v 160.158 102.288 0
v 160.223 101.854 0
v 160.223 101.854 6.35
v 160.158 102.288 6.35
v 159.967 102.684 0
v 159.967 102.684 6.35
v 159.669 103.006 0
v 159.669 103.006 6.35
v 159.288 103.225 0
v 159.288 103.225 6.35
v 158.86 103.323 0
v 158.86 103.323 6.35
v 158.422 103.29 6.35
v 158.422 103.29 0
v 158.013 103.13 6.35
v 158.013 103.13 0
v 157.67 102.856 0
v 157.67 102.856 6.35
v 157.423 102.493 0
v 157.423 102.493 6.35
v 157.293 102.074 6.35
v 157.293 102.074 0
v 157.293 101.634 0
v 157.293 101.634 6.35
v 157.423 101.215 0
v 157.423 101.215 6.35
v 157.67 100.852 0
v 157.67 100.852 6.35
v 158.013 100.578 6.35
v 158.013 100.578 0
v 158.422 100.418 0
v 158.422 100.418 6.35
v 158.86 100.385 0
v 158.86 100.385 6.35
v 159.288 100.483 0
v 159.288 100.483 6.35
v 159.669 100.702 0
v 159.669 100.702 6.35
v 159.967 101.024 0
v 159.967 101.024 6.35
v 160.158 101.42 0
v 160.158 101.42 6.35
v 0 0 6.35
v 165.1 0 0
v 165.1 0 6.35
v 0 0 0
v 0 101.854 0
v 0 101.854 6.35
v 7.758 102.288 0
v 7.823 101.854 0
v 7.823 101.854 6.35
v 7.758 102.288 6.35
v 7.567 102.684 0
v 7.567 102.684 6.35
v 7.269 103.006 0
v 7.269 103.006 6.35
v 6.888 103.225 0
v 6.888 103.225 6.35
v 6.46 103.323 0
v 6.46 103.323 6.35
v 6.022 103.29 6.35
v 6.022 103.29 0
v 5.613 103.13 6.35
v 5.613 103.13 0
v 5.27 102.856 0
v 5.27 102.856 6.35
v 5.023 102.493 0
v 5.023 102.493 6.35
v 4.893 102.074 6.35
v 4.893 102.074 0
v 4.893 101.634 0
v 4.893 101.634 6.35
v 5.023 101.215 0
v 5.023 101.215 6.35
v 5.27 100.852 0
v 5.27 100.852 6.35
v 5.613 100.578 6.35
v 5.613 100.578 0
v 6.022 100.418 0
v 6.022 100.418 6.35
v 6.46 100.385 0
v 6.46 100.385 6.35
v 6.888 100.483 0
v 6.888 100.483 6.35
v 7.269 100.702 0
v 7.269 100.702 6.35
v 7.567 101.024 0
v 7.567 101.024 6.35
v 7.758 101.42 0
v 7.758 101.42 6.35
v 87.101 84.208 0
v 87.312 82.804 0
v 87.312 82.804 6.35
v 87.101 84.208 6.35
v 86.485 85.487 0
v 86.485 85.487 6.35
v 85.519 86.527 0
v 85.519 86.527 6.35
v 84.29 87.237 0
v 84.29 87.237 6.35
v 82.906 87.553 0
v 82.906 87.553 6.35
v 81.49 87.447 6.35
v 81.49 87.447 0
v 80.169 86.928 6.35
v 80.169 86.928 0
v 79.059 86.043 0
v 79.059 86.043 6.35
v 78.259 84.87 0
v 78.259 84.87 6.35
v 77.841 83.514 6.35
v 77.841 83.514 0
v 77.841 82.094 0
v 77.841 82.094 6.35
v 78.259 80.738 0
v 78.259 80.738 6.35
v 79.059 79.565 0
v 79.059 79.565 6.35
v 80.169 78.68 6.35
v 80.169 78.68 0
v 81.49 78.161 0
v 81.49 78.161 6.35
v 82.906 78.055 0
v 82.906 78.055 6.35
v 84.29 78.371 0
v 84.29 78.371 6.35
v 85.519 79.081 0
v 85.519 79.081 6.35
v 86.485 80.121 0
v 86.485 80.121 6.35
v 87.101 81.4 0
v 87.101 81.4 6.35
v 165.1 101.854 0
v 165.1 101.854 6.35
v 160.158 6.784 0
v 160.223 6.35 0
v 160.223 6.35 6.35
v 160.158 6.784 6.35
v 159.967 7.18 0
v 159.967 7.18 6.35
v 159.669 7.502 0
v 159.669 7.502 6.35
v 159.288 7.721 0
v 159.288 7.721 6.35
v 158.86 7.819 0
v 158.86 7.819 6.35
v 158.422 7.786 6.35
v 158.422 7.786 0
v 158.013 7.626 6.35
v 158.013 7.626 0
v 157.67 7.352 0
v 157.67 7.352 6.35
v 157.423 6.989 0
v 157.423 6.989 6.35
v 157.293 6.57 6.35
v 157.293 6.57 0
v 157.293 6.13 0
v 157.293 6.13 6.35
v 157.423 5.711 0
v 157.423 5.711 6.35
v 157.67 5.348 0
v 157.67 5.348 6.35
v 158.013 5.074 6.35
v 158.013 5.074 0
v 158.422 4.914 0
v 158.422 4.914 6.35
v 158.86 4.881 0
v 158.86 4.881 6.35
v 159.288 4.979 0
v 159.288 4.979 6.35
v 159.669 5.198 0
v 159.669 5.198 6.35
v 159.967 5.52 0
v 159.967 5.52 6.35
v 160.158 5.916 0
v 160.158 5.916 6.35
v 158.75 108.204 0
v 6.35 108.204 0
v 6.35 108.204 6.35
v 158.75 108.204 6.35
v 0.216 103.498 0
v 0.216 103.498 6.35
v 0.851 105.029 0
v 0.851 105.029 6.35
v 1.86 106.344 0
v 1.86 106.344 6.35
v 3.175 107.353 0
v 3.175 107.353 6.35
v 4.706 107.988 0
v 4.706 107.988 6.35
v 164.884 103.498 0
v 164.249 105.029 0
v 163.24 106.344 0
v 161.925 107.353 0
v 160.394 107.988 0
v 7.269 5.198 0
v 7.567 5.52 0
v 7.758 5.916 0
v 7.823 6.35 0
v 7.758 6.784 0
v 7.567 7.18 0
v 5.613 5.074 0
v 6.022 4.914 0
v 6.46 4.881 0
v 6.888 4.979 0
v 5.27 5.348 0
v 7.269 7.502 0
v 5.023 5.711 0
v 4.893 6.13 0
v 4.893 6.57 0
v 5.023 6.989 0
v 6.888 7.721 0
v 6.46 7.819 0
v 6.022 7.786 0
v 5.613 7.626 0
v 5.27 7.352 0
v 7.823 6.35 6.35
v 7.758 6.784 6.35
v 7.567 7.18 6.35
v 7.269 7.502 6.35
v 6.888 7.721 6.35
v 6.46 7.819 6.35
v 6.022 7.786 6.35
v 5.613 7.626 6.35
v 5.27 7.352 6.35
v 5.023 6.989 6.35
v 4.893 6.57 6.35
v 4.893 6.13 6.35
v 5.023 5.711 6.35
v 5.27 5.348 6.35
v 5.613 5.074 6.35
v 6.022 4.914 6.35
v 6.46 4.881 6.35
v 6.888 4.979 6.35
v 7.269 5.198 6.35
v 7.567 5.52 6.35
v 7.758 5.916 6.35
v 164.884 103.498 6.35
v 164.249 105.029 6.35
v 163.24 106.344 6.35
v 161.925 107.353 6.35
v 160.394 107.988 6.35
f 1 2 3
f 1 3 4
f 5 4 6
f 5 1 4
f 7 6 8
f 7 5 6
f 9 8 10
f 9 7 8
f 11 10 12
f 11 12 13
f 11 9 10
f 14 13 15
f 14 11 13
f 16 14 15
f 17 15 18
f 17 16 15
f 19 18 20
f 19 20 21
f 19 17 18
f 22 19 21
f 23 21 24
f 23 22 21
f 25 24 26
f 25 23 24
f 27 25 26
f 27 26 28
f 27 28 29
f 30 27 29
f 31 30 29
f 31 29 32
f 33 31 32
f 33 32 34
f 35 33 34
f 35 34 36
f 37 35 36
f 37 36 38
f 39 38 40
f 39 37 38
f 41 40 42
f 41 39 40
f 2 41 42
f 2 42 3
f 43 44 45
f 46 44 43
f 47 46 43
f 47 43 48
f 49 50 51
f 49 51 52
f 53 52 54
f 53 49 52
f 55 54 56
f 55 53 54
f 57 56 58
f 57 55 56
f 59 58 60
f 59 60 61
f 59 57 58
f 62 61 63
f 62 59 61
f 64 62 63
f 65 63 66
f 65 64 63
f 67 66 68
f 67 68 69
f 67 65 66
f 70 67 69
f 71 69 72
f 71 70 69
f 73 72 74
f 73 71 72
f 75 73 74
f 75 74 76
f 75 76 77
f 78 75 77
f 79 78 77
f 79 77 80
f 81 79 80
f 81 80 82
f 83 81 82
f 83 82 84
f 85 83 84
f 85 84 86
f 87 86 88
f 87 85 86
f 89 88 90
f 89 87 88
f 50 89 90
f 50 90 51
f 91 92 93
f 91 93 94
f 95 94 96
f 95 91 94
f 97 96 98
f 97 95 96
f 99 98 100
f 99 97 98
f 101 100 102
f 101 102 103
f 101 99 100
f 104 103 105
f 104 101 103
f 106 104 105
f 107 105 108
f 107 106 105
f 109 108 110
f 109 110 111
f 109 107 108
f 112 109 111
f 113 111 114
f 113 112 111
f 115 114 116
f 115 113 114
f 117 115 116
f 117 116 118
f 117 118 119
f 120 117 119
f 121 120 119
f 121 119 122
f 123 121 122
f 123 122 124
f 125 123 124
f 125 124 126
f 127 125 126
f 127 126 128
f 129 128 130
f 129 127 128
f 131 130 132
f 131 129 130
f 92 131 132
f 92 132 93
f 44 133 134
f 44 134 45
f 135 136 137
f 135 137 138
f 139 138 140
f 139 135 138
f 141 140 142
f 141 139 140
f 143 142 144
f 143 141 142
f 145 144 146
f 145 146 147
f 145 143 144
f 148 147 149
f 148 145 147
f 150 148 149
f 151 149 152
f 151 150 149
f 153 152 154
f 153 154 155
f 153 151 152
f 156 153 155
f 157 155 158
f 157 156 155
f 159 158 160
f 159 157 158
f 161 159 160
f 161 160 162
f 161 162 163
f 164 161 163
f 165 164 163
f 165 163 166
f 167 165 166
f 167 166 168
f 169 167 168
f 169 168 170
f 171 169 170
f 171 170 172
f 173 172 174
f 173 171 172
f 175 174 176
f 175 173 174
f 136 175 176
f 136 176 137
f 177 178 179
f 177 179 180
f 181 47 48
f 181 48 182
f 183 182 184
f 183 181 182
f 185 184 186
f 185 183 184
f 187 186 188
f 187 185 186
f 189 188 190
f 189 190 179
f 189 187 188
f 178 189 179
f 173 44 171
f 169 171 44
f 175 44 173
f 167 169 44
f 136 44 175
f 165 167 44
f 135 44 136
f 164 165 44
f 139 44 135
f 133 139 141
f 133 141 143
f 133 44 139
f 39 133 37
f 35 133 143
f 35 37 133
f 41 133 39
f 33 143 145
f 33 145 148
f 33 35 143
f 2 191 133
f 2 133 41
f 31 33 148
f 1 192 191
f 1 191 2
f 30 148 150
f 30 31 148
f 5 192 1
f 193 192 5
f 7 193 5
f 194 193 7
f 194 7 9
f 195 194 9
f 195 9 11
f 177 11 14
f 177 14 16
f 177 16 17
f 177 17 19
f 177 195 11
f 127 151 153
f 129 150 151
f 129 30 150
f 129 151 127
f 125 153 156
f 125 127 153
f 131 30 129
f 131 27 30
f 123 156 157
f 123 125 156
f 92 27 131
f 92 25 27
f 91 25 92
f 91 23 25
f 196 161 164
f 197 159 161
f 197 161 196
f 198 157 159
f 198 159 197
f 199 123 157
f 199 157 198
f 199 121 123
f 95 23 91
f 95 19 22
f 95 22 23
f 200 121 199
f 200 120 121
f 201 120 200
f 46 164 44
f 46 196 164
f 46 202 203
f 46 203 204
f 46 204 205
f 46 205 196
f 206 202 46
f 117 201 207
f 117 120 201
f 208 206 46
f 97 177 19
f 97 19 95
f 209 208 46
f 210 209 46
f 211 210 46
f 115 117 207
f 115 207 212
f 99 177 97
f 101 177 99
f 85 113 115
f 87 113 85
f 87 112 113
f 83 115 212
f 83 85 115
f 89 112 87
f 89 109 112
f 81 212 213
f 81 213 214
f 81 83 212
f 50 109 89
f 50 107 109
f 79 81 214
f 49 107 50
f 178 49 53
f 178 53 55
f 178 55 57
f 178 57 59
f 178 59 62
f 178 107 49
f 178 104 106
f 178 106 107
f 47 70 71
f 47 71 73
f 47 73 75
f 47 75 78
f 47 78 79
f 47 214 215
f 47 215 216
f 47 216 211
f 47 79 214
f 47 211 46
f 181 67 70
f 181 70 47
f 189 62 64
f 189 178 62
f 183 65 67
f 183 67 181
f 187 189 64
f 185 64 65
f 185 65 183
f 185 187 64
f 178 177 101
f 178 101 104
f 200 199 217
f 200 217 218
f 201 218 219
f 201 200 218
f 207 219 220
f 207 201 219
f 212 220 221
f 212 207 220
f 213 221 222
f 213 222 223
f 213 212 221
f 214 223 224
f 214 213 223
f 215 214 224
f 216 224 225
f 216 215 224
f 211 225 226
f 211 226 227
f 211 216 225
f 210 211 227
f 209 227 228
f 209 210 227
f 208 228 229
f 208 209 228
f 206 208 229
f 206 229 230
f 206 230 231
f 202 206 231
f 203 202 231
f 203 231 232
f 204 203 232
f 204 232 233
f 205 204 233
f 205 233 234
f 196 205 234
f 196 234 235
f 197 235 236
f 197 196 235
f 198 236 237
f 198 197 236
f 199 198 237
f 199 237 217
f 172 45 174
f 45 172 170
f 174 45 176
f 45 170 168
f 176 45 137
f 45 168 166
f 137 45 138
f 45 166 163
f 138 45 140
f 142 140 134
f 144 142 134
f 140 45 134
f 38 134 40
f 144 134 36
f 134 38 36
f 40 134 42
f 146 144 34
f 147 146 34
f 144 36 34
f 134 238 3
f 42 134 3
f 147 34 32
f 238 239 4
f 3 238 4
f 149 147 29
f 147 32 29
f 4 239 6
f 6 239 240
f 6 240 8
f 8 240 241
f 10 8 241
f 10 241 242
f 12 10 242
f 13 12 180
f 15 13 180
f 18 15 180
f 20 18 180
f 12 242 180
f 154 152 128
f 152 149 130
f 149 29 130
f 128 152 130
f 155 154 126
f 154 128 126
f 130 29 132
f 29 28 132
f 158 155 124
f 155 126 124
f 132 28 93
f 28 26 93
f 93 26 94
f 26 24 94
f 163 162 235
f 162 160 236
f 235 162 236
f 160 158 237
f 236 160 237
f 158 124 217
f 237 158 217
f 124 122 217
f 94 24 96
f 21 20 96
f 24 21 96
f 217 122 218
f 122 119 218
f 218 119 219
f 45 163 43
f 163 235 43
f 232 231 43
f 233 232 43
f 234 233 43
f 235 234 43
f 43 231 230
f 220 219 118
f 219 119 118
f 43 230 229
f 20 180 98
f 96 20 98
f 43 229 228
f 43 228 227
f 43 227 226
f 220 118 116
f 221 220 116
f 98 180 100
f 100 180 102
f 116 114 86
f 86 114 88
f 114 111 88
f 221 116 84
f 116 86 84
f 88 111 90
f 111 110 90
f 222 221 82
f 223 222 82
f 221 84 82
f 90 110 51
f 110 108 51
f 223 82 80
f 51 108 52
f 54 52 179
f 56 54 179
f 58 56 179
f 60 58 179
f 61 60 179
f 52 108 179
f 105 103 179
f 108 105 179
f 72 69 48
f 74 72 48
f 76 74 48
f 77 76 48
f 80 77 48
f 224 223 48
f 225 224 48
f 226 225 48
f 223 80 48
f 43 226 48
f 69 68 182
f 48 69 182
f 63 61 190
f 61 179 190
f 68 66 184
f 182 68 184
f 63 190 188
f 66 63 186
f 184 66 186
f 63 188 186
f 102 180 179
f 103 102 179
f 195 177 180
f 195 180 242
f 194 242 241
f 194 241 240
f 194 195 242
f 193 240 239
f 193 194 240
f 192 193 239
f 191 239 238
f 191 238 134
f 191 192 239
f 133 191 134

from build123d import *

# Parameters (mm, degrees)
SKETCH1_R           = 1.4732
SKETCH1_R_2         = 4.7625
BOSS_EXTRUDE1_DEPTH = 6.35


with BuildPart() as part:
    # Sketch1 → Boss-Extrude1 (new body)
    with BuildSketch(Plane.XY):
        with BuildLine():
            Line((0, 0), (0, 101.854))
            ThreePointArc((0, 101.854), (1.859871939, 106.344128061), (6.35, 108.204))
            Line((6.35, 108.204), (158.75, 108.204))
            ThreePointArc((158.75, 108.204), (163.240128061, 106.344128061), (165.1, 101.854))
            Line((165.1, 101.854), (165.1, 0))
            Line((165.1, 0), (0, 0))
        make_face()
        with Locations((6.35, 6.35)):
            Circle(SKETCH1_R, mode=Mode.SUBTRACT)
        with Locations((158.75, 6.35)):
            Circle(SKETCH1_R, mode=Mode.SUBTRACT)
        with Locations((158.75, 101.854)):
            Circle(SKETCH1_R, mode=Mode.SUBTRACT)
        with Locations((6.35, 101.854)):
            Circle(SKETCH1_R, mode=Mode.SUBTRACT)
        with Locations((82.55, 82.804)):
            Circle(SKETCH1_R_2, mode=Mode.SUBTRACT)
    extrude(amount=BOSS_EXTRUDE1_DEPTH)


solid = part.part
